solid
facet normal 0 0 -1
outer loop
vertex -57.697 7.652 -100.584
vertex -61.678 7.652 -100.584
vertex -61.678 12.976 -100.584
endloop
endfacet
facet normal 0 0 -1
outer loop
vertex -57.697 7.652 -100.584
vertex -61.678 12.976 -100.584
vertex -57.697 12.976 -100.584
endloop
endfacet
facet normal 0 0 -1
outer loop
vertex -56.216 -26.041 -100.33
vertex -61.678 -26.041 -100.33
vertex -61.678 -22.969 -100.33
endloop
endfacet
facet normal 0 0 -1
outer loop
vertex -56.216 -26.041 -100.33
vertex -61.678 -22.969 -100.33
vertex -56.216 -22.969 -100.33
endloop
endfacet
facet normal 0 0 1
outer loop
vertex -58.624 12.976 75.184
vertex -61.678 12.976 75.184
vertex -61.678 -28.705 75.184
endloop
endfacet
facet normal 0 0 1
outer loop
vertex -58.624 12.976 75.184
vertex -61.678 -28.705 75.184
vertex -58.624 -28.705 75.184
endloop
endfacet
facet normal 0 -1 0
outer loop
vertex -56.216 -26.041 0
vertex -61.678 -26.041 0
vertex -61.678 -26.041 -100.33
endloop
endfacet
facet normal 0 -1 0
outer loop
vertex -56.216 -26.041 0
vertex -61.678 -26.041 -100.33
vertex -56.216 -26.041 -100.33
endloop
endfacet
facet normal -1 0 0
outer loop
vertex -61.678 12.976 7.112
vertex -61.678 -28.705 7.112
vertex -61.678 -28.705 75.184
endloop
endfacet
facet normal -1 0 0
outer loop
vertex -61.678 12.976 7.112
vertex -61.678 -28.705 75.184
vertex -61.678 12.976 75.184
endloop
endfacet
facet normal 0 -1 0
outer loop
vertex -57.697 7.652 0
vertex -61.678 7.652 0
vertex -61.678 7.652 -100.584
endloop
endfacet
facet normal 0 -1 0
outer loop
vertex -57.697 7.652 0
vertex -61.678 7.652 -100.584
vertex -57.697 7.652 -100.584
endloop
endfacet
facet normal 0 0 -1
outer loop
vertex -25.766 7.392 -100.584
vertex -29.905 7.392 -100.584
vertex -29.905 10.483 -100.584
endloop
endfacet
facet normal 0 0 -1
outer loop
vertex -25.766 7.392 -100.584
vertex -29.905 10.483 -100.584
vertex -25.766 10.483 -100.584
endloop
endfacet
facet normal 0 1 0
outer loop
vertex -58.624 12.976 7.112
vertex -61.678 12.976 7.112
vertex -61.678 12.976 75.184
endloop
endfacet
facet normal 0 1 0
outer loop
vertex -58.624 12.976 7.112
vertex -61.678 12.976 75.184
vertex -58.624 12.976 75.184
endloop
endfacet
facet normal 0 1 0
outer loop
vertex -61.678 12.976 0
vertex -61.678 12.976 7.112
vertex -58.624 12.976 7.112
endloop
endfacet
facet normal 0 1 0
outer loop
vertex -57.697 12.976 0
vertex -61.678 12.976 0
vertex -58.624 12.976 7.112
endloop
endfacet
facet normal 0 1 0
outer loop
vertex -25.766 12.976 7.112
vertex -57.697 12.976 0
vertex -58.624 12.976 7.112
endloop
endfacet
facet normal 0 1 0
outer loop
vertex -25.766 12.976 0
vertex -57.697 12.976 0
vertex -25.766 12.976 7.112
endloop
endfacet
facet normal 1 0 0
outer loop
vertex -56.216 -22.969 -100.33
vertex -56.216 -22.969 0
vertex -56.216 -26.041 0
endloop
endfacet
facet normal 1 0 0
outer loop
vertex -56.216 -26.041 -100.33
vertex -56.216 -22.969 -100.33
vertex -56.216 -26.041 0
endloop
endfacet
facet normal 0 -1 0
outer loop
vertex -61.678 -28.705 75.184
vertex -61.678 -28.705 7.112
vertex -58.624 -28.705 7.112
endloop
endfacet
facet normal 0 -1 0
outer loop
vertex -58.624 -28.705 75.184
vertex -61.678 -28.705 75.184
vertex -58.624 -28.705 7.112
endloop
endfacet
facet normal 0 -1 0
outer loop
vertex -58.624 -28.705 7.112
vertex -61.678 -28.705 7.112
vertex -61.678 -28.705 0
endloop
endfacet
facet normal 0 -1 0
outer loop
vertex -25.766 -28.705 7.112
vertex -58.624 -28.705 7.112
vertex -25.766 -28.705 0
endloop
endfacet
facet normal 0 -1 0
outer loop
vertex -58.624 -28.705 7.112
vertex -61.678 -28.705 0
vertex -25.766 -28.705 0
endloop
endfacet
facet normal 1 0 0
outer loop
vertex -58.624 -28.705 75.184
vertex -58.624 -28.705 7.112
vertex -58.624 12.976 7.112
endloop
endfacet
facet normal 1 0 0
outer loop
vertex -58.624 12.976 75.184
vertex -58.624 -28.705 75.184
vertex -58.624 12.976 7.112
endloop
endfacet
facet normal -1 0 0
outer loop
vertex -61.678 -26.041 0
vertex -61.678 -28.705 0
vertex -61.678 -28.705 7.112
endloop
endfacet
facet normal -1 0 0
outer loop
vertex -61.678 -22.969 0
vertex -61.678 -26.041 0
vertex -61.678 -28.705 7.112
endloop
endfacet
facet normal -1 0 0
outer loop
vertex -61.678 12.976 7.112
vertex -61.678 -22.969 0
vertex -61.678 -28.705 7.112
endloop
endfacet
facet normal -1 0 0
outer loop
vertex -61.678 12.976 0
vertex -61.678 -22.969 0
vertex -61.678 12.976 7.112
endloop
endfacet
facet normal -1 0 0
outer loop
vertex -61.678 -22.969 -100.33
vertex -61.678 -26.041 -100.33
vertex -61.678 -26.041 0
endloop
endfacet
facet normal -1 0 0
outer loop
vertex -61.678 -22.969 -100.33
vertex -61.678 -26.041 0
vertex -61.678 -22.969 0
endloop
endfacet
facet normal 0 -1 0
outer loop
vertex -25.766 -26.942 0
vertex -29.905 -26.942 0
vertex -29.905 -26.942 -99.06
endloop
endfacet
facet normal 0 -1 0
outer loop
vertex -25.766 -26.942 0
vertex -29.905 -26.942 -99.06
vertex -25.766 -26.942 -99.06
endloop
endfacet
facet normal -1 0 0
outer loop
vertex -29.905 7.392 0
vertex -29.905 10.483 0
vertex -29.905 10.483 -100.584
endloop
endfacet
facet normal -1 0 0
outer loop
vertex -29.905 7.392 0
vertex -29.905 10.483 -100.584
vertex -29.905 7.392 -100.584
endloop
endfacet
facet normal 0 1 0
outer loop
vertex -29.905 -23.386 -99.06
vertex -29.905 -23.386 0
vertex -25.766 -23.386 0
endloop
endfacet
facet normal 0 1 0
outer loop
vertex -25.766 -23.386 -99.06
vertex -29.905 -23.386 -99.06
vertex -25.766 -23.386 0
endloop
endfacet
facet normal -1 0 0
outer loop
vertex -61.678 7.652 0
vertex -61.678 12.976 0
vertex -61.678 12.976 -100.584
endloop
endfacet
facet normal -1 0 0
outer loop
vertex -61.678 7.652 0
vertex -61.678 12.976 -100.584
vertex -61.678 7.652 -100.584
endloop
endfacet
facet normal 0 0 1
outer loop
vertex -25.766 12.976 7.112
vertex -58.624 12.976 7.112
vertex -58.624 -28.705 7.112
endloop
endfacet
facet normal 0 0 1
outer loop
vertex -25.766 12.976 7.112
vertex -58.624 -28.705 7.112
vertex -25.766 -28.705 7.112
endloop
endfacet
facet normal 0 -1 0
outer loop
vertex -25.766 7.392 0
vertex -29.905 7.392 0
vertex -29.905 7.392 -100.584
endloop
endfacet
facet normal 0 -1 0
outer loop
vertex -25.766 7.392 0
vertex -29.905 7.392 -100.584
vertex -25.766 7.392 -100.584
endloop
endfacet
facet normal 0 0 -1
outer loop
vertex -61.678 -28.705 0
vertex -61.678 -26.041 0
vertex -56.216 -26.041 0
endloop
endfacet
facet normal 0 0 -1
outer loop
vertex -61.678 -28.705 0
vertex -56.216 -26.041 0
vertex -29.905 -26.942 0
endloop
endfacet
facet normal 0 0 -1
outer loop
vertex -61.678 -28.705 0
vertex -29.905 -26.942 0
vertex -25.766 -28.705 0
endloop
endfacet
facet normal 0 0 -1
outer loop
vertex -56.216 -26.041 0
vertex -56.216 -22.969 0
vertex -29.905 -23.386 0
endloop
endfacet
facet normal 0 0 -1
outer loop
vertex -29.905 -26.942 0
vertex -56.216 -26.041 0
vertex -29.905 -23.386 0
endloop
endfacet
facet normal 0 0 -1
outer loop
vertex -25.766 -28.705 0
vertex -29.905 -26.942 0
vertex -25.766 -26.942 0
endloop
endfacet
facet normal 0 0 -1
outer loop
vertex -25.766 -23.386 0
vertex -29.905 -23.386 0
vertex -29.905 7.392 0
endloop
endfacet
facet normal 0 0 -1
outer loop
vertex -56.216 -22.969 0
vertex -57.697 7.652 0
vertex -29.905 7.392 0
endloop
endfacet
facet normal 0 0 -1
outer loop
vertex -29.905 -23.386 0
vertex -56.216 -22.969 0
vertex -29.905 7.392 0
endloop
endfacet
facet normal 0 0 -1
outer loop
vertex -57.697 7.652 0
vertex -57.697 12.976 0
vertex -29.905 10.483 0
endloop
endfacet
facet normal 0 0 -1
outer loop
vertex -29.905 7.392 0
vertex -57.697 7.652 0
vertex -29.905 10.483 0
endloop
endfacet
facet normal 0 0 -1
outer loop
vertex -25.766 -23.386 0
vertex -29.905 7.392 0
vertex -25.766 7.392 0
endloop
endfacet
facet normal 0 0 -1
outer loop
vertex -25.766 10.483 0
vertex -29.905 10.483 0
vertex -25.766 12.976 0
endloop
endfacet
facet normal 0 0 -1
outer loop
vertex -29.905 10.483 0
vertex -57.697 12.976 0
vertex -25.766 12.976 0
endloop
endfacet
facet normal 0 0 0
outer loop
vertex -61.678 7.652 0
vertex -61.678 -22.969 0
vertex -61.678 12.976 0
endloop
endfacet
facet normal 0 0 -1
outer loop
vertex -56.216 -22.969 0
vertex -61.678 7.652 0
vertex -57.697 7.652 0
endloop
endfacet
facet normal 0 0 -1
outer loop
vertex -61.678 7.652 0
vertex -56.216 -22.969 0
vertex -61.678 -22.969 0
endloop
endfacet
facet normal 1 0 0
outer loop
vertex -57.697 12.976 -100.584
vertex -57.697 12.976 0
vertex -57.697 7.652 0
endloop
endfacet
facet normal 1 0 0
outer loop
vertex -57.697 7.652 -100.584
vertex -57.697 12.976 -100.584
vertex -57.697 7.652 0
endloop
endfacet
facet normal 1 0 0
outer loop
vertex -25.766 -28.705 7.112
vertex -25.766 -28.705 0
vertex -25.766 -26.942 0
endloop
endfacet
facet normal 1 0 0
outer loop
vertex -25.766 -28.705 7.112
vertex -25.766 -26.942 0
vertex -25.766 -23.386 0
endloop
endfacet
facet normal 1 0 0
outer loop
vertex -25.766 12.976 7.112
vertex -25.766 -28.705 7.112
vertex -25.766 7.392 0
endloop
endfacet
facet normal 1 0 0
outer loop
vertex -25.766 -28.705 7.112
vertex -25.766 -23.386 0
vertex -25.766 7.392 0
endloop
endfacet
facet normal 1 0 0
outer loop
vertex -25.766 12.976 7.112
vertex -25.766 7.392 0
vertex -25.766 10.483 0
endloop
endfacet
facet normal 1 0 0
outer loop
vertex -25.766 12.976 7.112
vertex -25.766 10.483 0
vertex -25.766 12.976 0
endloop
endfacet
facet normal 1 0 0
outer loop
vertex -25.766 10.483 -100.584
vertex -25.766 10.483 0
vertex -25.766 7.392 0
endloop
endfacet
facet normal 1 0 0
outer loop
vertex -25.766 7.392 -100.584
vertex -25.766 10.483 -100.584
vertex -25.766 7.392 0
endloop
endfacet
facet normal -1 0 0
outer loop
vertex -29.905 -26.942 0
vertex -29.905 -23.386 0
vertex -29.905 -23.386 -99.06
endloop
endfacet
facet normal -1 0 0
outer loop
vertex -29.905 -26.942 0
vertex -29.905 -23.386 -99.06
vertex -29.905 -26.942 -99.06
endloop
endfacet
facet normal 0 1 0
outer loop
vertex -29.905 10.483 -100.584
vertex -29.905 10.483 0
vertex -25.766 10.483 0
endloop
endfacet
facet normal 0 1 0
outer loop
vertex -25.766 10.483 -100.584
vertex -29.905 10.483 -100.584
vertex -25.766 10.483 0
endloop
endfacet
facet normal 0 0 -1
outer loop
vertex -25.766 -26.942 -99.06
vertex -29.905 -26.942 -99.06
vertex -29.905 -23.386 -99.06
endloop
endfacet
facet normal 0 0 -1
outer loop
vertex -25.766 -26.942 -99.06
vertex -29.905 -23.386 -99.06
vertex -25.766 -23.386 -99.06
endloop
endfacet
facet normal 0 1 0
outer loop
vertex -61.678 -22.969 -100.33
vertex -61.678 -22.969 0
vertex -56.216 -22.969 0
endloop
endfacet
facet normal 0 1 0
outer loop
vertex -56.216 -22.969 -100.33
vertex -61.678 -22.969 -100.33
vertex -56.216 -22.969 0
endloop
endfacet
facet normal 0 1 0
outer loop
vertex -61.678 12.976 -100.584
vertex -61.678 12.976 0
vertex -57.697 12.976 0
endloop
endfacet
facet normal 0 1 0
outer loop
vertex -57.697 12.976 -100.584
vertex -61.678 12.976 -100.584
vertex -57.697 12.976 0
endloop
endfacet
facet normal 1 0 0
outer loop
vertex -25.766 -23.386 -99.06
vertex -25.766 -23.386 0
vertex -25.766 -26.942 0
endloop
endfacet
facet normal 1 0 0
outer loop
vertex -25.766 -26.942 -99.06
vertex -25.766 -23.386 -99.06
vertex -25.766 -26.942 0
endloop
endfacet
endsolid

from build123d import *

# Parameters (mm, degrees)
F0_W      = 35.91213
F0_H      = 41.681683
F1_DEPTH  = 7.112
F2_W      = 4.138863
F2_H      = 3.556104
F3_DEPTH  = 99.06
F4_W      = 4.138863
F4_H      = 3.091657
F5_DEPTH  = 100.584
F6_W      = 3.981255
F6_H      = 5.324956
F7_DEPTH  = 100.584
F8_W      = 5.462058
F8_H      = 3.072897
F9_DEPTH  = 100.33
F10_W     = 3.054641
F10_H     = 41.681683
F11_DEPTH = 68.072


with BuildPart() as f1:
    # F0 (on Top) → F1 (new body)
    with BuildSketch(Plane.XY):
        with Locations((-43.722132, -7.864382)):
            Rectangle(F0_W, F0_H)
    extrude(amount=F1_DEPTH)

    # F2 (on face) → F3 (join)
    with BuildSketch(Plane(origin=(0, 0, 0), x_dir=(1, 0, 0), z_dir=(0, 0, -1))):
        with Locations((-27.835498, 25.163998)):
            Rectangle(F2_W, F2_H)
    extrude(amount=F3_DEPTH)

    # F4 (on face) → F5 (join)
    with BuildSketch(Plane(origin=(0, 0, 0), x_dir=(1, 0, 0), z_dir=(0, 0, -1))):
        with Locations((-27.835498, -8.937603)):
            Rectangle(F4_W, F4_H)
    extrude(amount=F5_DEPTH)

    # F6 (on face) → F7 (join)
    with BuildSketch(Plane(origin=(0, 0, 0), x_dir=(1, 0, 0), z_dir=(0, 0, -1))):
        with Locations((-59.687569, -10.313982)):
            Rectangle(F6_W, F6_H)
    extrude(amount=F7_DEPTH)

    # F8 (on face) → F9 (join)
    with BuildSketch(Plane(origin=(0, 0, 0), x_dir=(1, 0, 0), z_dir=(0, 0, -1))):
        with Locations((-58.947168, 24.504973)):
            Rectangle(F8_W, F8_H)
    extrude(amount=F9_DEPTH)

    # F10 (on face) → F11 (join)
    with BuildSketch(Plane.XY.offset(7.112)):
        with Locations((-60.150876, -7.864382)):
            Rectangle(F10_W, F10_H)
    extrude(amount=F11_DEPTH)


solid = f1.part
